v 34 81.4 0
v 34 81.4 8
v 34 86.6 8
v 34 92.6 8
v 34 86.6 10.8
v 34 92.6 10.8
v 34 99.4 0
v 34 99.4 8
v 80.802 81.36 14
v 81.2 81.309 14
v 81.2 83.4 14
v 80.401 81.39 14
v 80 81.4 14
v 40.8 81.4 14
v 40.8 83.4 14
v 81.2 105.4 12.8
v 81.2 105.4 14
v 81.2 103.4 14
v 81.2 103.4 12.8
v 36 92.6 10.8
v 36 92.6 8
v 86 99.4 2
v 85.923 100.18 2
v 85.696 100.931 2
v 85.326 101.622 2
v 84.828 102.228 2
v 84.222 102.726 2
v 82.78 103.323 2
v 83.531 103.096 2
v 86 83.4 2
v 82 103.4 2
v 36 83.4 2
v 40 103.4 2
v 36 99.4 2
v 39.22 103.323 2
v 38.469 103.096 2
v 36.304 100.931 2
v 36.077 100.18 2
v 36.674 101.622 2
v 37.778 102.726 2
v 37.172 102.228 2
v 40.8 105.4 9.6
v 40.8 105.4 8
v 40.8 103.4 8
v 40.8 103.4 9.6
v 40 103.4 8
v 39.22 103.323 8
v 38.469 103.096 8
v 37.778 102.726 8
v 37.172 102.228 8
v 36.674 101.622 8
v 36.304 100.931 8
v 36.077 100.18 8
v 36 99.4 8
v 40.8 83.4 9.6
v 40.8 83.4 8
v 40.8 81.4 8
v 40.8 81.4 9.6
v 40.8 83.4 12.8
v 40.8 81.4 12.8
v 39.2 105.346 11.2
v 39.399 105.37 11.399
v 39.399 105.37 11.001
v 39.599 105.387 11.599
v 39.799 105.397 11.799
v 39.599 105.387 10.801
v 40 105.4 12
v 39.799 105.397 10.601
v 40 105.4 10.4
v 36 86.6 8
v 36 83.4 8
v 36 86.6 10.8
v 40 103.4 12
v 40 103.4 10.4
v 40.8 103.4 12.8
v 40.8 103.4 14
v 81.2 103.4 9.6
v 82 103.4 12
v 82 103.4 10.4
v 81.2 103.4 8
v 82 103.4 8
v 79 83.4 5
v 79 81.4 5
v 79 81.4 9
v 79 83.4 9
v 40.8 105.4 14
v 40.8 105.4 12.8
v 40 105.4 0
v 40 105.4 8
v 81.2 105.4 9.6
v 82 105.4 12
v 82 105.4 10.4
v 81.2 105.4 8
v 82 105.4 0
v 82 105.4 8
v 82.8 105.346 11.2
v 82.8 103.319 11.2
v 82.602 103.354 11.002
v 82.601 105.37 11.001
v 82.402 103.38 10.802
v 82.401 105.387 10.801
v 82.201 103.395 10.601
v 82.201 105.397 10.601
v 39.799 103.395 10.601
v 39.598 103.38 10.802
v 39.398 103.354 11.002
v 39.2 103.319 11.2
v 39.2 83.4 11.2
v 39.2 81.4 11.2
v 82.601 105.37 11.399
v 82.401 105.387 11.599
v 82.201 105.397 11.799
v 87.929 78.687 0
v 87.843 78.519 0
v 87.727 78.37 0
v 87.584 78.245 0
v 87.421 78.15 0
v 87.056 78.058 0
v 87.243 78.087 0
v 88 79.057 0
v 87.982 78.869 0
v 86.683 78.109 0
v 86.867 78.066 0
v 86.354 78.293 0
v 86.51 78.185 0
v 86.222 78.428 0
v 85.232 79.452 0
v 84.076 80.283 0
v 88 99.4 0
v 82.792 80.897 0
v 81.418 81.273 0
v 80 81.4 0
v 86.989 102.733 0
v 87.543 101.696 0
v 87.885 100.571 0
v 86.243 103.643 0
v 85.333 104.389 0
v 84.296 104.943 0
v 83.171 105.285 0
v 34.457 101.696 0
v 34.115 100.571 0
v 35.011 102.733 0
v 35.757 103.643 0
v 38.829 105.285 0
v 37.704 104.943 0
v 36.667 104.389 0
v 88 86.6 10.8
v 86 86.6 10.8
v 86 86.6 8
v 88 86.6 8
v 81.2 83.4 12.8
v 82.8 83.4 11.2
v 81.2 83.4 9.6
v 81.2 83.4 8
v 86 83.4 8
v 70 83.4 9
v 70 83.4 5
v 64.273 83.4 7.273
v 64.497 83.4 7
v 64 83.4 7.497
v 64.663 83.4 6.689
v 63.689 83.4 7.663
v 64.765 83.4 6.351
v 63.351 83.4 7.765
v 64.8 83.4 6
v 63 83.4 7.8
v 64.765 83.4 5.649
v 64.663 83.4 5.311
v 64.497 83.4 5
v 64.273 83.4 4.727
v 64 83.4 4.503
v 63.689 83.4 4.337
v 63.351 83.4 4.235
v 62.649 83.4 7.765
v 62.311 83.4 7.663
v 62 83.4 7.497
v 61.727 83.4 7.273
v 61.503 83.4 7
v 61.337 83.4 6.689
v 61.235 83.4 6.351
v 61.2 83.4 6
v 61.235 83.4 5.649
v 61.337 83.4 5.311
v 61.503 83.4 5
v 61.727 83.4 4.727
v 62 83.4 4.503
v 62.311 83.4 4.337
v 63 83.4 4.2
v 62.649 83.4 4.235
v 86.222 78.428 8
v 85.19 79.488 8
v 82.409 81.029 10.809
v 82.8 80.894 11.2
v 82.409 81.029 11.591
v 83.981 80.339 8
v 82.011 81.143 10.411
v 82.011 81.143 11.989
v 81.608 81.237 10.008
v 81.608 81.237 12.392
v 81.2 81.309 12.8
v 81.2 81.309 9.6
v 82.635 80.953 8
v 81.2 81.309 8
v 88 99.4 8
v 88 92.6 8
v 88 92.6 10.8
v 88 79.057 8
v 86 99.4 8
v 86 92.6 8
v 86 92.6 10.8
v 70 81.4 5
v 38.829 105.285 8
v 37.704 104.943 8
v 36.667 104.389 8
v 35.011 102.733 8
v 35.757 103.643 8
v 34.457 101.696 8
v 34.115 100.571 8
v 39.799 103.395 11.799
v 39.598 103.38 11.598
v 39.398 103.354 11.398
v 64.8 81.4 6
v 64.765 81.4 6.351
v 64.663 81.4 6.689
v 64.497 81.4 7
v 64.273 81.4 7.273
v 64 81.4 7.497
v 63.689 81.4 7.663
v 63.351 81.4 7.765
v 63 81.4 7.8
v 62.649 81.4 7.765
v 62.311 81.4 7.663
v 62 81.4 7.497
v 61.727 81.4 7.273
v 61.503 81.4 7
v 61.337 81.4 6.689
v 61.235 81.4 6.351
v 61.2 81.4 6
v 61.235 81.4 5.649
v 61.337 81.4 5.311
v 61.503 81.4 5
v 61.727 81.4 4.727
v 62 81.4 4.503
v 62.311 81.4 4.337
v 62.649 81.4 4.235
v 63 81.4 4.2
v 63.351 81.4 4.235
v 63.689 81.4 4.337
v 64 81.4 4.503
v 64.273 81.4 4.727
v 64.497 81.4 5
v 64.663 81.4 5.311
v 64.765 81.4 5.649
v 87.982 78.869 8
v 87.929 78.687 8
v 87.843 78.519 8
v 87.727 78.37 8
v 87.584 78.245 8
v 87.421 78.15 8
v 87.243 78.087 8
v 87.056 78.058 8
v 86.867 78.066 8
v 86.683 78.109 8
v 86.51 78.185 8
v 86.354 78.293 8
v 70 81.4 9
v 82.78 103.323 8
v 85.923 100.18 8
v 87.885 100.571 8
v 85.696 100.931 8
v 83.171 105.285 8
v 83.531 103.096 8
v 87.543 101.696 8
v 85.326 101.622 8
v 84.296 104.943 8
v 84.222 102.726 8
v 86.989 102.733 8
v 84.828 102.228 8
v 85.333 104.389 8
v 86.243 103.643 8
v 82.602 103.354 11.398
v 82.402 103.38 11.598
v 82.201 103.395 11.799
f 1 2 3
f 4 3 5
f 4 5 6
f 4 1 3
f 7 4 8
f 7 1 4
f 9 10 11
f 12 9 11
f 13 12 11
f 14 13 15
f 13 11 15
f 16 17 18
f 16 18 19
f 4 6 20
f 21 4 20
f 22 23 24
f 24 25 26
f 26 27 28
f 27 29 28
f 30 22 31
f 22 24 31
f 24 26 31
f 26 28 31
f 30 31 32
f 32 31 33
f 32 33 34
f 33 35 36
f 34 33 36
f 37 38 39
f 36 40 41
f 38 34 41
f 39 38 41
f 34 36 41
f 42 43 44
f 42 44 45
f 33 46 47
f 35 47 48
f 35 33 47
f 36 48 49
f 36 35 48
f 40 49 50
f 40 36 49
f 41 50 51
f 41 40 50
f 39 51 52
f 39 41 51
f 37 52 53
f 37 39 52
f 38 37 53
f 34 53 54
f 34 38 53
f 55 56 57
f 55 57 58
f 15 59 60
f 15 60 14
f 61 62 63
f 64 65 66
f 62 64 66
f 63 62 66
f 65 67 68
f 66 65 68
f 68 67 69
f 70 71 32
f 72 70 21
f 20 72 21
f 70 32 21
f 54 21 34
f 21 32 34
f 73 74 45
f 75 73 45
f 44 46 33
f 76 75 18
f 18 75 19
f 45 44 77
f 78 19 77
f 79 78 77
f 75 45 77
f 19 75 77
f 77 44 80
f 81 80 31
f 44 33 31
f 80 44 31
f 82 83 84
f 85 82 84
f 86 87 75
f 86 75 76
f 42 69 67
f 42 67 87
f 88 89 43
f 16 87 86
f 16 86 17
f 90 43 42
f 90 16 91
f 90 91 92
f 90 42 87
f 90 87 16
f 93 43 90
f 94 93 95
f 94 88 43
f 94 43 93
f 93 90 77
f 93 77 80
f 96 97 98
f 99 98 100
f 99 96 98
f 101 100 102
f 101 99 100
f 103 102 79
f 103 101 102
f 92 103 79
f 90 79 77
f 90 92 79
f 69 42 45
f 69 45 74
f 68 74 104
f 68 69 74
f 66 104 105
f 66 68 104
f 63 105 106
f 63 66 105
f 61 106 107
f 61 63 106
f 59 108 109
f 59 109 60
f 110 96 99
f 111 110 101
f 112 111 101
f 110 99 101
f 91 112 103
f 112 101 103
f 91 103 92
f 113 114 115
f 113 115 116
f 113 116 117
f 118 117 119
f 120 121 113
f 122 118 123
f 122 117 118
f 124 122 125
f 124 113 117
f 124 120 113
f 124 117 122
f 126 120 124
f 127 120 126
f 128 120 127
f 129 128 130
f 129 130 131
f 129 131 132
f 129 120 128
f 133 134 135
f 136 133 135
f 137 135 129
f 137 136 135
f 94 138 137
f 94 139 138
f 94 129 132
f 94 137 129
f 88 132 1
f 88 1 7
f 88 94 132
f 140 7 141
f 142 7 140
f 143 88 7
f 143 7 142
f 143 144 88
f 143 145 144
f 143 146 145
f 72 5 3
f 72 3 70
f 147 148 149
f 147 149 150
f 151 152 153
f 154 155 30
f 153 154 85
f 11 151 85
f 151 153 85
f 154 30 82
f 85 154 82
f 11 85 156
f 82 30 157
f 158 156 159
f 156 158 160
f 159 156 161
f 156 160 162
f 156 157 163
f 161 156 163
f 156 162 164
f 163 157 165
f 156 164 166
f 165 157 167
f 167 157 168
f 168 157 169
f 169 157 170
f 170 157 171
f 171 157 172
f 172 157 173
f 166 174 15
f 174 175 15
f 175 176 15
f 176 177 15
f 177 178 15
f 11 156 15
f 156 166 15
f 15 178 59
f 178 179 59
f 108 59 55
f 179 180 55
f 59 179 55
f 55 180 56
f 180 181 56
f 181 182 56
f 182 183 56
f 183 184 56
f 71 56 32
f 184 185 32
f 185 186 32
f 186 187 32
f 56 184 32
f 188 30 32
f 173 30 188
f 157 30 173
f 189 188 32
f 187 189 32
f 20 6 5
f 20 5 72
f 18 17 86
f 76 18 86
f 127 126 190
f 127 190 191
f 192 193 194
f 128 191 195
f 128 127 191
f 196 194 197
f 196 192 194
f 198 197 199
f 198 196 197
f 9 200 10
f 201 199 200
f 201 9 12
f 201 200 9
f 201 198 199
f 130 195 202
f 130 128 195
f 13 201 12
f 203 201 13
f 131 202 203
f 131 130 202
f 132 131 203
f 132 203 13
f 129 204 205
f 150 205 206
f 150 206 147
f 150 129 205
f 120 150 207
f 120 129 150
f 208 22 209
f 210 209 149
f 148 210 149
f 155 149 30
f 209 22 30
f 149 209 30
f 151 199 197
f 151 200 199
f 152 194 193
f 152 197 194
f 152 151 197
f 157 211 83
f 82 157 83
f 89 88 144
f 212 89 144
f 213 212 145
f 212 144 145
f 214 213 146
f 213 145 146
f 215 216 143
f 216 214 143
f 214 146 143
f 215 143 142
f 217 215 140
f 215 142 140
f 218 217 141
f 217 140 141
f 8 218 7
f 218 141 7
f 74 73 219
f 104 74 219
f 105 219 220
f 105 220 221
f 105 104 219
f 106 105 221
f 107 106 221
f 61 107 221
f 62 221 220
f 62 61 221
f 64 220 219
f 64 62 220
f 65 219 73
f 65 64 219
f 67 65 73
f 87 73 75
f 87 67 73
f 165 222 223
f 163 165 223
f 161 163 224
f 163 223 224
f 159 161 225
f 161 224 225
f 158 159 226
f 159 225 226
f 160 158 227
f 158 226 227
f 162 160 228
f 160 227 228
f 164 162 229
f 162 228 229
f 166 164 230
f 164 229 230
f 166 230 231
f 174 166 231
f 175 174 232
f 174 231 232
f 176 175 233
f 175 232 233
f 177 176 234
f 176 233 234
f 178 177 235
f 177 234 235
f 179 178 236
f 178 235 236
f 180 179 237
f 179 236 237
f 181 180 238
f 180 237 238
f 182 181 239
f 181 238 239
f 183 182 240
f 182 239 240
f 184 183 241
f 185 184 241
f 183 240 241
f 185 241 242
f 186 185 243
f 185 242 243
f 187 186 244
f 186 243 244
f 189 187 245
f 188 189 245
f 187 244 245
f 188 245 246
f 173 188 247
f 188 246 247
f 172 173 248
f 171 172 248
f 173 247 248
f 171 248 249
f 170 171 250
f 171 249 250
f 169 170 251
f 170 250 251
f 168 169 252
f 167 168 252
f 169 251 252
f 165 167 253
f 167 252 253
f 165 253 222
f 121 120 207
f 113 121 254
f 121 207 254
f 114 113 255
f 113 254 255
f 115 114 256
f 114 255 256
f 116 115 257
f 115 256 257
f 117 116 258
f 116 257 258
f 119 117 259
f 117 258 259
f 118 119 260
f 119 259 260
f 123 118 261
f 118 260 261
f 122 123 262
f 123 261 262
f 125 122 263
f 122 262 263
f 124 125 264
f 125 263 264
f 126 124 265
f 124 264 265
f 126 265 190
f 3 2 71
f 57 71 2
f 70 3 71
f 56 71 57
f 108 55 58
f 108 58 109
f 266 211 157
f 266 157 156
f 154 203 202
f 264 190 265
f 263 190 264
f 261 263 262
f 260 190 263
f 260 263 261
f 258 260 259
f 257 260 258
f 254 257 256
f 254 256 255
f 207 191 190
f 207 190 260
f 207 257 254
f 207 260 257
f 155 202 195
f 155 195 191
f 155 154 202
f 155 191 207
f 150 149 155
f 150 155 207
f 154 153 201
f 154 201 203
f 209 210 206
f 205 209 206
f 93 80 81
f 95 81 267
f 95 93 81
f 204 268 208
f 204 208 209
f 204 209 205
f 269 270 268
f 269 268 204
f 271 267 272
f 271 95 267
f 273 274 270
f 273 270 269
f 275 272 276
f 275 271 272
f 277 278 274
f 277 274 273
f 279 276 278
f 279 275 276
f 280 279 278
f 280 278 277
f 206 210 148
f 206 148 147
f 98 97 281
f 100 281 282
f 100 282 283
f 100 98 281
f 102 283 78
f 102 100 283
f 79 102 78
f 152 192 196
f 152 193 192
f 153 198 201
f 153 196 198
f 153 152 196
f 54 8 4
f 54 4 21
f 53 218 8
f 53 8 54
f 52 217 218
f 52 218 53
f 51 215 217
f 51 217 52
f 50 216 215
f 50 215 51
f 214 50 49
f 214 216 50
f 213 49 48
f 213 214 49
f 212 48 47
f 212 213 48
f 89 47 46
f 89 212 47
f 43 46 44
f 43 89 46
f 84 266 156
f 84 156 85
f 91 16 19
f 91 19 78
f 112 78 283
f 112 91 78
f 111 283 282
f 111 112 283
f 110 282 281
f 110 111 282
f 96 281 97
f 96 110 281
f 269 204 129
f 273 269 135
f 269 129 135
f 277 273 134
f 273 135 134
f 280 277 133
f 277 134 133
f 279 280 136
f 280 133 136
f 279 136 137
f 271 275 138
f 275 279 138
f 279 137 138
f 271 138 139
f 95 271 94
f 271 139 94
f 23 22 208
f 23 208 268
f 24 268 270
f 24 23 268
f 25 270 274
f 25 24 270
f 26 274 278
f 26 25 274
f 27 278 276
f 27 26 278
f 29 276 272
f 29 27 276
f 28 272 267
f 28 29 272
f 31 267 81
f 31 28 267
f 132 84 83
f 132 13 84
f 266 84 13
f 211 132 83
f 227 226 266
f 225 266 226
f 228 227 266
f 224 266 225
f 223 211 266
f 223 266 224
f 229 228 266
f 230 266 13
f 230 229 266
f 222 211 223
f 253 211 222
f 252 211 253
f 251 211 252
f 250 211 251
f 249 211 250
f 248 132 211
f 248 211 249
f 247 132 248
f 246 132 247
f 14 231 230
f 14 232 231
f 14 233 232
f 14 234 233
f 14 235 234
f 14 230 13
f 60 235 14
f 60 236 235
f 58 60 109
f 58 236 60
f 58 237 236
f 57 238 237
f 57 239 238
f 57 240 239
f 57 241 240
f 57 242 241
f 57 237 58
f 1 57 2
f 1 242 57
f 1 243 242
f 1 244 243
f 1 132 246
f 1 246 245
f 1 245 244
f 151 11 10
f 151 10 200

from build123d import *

# Parameters (mm, degrees)
PAD018_DEPTH    = 14
POCKET026_DEPTH = 12
FILLET004_R     = 1
POCKET029_DEPTH = 27.344146
SKETCH088_R     = 1.8
SKETCH088_W     = 9
SKETCH088_H     = 4
POCKET030_DEPTH = 2
SKETCH090_W     = 2
SKETCH090_H     = 6
PAD020_DEPTH    = 2.8


with BuildPart() as part:
    # Sketch079 → Pad018 (new body)
    with BuildSketch(Plane.XY):
        with BuildLine():
            Line((40, 105.4), (82, 105.4))
            ThreePointArc((88, 99.4), (86.242641, 103.642641), (82, 105.4))
            Line((88, 99.4), (88, 73.4))
            ThreePointArc((88, 73.4), (85.656854, 79.056854), (80, 81.4))
            Line((80, 81.4), (34, 81.4))
            Line((34, 81.4), (34, 99.4))
            ThreePointArc((40, 105.4), (35.757359, 103.642641), (34, 99.4))
        make_face()
    extrude(amount=PAD018_DEPTH)

    # Sketch076 → Pocket026 (cut)
    with BuildSketch(Plane.XY.offset(2)):
        with BuildLine():
            Line((40, 103.4), (82, 103.4))
            ThreePointArc((86, 99.4), (84.828427, 102.228427), (82, 103.4))
            Line((86, 99.4), (86, 83.4))
            Line((86, 83.4), (36, 83.4))
            Line((36, 83.4), (36, 99.4))
            ThreePointArc((40, 103.4), (37.171573, 102.228427), (36, 99.4))
        make_face()
    extrude(amount=POCKET026_DEPTH, mode=Mode.SUBTRACT)

    # Fillet004
    fillet004_edges = [part.edges().sort_by_distance(p)[0] for p in [
        (88, 73.4, 7),
    ]]
    fillet(fillet004_edges, radius=FILLET004_R)

    # Sketch087 (on DatumPlane) → Pocket029 (cut, through all)
    with BuildSketch(Plane(origin=(0, 105.4, 0), x_dir=(-1, 0, 0), z_dir=(0, 1, 0))):
        Polygon((-88, 14), (-81.2, 14), (-81.2, 12.8), (-82.8, 11.2), (-81.2, 9.6), (-81.2, 8), (-88, 8), align=None)
        Polygon((-40.8, 14), (-34, 14), (-34, 8), (-40.8, 8), (-40.8, 9.6), (-39.2, 11.2), (-40.8, 12.8), align=None)
    extrude(amount=-POCKET029_DEPTH, mode=Mode.SUBTRACT)

    # Sketch088 (on DatumPlane) → Pocket030 (cut)
    with BuildSketch(Plane.XZ.offset(-81.4)):
        with Locations((63, 6)):
            Circle(SKETCH088_R)
        with Locations((74.5, 7)):
            Rectangle(SKETCH088_W, SKETCH088_H)
    extrude(amount=-POCKET030_DEPTH, mode=Mode.SUBTRACT)

    # Sketch090 (on DatumPlane) → Pad020 (join)
    with BuildSketch(Plane.XY.offset(8)):
        with Locations((35, 89.6)):
            Rectangle(SKETCH090_W, SKETCH090_H)
        with Locations((87, 89.6)):
            Rectangle(SKETCH090_W, SKETCH090_H)
    extrude(amount=PAD020_DEPTH)


solid = part.part
